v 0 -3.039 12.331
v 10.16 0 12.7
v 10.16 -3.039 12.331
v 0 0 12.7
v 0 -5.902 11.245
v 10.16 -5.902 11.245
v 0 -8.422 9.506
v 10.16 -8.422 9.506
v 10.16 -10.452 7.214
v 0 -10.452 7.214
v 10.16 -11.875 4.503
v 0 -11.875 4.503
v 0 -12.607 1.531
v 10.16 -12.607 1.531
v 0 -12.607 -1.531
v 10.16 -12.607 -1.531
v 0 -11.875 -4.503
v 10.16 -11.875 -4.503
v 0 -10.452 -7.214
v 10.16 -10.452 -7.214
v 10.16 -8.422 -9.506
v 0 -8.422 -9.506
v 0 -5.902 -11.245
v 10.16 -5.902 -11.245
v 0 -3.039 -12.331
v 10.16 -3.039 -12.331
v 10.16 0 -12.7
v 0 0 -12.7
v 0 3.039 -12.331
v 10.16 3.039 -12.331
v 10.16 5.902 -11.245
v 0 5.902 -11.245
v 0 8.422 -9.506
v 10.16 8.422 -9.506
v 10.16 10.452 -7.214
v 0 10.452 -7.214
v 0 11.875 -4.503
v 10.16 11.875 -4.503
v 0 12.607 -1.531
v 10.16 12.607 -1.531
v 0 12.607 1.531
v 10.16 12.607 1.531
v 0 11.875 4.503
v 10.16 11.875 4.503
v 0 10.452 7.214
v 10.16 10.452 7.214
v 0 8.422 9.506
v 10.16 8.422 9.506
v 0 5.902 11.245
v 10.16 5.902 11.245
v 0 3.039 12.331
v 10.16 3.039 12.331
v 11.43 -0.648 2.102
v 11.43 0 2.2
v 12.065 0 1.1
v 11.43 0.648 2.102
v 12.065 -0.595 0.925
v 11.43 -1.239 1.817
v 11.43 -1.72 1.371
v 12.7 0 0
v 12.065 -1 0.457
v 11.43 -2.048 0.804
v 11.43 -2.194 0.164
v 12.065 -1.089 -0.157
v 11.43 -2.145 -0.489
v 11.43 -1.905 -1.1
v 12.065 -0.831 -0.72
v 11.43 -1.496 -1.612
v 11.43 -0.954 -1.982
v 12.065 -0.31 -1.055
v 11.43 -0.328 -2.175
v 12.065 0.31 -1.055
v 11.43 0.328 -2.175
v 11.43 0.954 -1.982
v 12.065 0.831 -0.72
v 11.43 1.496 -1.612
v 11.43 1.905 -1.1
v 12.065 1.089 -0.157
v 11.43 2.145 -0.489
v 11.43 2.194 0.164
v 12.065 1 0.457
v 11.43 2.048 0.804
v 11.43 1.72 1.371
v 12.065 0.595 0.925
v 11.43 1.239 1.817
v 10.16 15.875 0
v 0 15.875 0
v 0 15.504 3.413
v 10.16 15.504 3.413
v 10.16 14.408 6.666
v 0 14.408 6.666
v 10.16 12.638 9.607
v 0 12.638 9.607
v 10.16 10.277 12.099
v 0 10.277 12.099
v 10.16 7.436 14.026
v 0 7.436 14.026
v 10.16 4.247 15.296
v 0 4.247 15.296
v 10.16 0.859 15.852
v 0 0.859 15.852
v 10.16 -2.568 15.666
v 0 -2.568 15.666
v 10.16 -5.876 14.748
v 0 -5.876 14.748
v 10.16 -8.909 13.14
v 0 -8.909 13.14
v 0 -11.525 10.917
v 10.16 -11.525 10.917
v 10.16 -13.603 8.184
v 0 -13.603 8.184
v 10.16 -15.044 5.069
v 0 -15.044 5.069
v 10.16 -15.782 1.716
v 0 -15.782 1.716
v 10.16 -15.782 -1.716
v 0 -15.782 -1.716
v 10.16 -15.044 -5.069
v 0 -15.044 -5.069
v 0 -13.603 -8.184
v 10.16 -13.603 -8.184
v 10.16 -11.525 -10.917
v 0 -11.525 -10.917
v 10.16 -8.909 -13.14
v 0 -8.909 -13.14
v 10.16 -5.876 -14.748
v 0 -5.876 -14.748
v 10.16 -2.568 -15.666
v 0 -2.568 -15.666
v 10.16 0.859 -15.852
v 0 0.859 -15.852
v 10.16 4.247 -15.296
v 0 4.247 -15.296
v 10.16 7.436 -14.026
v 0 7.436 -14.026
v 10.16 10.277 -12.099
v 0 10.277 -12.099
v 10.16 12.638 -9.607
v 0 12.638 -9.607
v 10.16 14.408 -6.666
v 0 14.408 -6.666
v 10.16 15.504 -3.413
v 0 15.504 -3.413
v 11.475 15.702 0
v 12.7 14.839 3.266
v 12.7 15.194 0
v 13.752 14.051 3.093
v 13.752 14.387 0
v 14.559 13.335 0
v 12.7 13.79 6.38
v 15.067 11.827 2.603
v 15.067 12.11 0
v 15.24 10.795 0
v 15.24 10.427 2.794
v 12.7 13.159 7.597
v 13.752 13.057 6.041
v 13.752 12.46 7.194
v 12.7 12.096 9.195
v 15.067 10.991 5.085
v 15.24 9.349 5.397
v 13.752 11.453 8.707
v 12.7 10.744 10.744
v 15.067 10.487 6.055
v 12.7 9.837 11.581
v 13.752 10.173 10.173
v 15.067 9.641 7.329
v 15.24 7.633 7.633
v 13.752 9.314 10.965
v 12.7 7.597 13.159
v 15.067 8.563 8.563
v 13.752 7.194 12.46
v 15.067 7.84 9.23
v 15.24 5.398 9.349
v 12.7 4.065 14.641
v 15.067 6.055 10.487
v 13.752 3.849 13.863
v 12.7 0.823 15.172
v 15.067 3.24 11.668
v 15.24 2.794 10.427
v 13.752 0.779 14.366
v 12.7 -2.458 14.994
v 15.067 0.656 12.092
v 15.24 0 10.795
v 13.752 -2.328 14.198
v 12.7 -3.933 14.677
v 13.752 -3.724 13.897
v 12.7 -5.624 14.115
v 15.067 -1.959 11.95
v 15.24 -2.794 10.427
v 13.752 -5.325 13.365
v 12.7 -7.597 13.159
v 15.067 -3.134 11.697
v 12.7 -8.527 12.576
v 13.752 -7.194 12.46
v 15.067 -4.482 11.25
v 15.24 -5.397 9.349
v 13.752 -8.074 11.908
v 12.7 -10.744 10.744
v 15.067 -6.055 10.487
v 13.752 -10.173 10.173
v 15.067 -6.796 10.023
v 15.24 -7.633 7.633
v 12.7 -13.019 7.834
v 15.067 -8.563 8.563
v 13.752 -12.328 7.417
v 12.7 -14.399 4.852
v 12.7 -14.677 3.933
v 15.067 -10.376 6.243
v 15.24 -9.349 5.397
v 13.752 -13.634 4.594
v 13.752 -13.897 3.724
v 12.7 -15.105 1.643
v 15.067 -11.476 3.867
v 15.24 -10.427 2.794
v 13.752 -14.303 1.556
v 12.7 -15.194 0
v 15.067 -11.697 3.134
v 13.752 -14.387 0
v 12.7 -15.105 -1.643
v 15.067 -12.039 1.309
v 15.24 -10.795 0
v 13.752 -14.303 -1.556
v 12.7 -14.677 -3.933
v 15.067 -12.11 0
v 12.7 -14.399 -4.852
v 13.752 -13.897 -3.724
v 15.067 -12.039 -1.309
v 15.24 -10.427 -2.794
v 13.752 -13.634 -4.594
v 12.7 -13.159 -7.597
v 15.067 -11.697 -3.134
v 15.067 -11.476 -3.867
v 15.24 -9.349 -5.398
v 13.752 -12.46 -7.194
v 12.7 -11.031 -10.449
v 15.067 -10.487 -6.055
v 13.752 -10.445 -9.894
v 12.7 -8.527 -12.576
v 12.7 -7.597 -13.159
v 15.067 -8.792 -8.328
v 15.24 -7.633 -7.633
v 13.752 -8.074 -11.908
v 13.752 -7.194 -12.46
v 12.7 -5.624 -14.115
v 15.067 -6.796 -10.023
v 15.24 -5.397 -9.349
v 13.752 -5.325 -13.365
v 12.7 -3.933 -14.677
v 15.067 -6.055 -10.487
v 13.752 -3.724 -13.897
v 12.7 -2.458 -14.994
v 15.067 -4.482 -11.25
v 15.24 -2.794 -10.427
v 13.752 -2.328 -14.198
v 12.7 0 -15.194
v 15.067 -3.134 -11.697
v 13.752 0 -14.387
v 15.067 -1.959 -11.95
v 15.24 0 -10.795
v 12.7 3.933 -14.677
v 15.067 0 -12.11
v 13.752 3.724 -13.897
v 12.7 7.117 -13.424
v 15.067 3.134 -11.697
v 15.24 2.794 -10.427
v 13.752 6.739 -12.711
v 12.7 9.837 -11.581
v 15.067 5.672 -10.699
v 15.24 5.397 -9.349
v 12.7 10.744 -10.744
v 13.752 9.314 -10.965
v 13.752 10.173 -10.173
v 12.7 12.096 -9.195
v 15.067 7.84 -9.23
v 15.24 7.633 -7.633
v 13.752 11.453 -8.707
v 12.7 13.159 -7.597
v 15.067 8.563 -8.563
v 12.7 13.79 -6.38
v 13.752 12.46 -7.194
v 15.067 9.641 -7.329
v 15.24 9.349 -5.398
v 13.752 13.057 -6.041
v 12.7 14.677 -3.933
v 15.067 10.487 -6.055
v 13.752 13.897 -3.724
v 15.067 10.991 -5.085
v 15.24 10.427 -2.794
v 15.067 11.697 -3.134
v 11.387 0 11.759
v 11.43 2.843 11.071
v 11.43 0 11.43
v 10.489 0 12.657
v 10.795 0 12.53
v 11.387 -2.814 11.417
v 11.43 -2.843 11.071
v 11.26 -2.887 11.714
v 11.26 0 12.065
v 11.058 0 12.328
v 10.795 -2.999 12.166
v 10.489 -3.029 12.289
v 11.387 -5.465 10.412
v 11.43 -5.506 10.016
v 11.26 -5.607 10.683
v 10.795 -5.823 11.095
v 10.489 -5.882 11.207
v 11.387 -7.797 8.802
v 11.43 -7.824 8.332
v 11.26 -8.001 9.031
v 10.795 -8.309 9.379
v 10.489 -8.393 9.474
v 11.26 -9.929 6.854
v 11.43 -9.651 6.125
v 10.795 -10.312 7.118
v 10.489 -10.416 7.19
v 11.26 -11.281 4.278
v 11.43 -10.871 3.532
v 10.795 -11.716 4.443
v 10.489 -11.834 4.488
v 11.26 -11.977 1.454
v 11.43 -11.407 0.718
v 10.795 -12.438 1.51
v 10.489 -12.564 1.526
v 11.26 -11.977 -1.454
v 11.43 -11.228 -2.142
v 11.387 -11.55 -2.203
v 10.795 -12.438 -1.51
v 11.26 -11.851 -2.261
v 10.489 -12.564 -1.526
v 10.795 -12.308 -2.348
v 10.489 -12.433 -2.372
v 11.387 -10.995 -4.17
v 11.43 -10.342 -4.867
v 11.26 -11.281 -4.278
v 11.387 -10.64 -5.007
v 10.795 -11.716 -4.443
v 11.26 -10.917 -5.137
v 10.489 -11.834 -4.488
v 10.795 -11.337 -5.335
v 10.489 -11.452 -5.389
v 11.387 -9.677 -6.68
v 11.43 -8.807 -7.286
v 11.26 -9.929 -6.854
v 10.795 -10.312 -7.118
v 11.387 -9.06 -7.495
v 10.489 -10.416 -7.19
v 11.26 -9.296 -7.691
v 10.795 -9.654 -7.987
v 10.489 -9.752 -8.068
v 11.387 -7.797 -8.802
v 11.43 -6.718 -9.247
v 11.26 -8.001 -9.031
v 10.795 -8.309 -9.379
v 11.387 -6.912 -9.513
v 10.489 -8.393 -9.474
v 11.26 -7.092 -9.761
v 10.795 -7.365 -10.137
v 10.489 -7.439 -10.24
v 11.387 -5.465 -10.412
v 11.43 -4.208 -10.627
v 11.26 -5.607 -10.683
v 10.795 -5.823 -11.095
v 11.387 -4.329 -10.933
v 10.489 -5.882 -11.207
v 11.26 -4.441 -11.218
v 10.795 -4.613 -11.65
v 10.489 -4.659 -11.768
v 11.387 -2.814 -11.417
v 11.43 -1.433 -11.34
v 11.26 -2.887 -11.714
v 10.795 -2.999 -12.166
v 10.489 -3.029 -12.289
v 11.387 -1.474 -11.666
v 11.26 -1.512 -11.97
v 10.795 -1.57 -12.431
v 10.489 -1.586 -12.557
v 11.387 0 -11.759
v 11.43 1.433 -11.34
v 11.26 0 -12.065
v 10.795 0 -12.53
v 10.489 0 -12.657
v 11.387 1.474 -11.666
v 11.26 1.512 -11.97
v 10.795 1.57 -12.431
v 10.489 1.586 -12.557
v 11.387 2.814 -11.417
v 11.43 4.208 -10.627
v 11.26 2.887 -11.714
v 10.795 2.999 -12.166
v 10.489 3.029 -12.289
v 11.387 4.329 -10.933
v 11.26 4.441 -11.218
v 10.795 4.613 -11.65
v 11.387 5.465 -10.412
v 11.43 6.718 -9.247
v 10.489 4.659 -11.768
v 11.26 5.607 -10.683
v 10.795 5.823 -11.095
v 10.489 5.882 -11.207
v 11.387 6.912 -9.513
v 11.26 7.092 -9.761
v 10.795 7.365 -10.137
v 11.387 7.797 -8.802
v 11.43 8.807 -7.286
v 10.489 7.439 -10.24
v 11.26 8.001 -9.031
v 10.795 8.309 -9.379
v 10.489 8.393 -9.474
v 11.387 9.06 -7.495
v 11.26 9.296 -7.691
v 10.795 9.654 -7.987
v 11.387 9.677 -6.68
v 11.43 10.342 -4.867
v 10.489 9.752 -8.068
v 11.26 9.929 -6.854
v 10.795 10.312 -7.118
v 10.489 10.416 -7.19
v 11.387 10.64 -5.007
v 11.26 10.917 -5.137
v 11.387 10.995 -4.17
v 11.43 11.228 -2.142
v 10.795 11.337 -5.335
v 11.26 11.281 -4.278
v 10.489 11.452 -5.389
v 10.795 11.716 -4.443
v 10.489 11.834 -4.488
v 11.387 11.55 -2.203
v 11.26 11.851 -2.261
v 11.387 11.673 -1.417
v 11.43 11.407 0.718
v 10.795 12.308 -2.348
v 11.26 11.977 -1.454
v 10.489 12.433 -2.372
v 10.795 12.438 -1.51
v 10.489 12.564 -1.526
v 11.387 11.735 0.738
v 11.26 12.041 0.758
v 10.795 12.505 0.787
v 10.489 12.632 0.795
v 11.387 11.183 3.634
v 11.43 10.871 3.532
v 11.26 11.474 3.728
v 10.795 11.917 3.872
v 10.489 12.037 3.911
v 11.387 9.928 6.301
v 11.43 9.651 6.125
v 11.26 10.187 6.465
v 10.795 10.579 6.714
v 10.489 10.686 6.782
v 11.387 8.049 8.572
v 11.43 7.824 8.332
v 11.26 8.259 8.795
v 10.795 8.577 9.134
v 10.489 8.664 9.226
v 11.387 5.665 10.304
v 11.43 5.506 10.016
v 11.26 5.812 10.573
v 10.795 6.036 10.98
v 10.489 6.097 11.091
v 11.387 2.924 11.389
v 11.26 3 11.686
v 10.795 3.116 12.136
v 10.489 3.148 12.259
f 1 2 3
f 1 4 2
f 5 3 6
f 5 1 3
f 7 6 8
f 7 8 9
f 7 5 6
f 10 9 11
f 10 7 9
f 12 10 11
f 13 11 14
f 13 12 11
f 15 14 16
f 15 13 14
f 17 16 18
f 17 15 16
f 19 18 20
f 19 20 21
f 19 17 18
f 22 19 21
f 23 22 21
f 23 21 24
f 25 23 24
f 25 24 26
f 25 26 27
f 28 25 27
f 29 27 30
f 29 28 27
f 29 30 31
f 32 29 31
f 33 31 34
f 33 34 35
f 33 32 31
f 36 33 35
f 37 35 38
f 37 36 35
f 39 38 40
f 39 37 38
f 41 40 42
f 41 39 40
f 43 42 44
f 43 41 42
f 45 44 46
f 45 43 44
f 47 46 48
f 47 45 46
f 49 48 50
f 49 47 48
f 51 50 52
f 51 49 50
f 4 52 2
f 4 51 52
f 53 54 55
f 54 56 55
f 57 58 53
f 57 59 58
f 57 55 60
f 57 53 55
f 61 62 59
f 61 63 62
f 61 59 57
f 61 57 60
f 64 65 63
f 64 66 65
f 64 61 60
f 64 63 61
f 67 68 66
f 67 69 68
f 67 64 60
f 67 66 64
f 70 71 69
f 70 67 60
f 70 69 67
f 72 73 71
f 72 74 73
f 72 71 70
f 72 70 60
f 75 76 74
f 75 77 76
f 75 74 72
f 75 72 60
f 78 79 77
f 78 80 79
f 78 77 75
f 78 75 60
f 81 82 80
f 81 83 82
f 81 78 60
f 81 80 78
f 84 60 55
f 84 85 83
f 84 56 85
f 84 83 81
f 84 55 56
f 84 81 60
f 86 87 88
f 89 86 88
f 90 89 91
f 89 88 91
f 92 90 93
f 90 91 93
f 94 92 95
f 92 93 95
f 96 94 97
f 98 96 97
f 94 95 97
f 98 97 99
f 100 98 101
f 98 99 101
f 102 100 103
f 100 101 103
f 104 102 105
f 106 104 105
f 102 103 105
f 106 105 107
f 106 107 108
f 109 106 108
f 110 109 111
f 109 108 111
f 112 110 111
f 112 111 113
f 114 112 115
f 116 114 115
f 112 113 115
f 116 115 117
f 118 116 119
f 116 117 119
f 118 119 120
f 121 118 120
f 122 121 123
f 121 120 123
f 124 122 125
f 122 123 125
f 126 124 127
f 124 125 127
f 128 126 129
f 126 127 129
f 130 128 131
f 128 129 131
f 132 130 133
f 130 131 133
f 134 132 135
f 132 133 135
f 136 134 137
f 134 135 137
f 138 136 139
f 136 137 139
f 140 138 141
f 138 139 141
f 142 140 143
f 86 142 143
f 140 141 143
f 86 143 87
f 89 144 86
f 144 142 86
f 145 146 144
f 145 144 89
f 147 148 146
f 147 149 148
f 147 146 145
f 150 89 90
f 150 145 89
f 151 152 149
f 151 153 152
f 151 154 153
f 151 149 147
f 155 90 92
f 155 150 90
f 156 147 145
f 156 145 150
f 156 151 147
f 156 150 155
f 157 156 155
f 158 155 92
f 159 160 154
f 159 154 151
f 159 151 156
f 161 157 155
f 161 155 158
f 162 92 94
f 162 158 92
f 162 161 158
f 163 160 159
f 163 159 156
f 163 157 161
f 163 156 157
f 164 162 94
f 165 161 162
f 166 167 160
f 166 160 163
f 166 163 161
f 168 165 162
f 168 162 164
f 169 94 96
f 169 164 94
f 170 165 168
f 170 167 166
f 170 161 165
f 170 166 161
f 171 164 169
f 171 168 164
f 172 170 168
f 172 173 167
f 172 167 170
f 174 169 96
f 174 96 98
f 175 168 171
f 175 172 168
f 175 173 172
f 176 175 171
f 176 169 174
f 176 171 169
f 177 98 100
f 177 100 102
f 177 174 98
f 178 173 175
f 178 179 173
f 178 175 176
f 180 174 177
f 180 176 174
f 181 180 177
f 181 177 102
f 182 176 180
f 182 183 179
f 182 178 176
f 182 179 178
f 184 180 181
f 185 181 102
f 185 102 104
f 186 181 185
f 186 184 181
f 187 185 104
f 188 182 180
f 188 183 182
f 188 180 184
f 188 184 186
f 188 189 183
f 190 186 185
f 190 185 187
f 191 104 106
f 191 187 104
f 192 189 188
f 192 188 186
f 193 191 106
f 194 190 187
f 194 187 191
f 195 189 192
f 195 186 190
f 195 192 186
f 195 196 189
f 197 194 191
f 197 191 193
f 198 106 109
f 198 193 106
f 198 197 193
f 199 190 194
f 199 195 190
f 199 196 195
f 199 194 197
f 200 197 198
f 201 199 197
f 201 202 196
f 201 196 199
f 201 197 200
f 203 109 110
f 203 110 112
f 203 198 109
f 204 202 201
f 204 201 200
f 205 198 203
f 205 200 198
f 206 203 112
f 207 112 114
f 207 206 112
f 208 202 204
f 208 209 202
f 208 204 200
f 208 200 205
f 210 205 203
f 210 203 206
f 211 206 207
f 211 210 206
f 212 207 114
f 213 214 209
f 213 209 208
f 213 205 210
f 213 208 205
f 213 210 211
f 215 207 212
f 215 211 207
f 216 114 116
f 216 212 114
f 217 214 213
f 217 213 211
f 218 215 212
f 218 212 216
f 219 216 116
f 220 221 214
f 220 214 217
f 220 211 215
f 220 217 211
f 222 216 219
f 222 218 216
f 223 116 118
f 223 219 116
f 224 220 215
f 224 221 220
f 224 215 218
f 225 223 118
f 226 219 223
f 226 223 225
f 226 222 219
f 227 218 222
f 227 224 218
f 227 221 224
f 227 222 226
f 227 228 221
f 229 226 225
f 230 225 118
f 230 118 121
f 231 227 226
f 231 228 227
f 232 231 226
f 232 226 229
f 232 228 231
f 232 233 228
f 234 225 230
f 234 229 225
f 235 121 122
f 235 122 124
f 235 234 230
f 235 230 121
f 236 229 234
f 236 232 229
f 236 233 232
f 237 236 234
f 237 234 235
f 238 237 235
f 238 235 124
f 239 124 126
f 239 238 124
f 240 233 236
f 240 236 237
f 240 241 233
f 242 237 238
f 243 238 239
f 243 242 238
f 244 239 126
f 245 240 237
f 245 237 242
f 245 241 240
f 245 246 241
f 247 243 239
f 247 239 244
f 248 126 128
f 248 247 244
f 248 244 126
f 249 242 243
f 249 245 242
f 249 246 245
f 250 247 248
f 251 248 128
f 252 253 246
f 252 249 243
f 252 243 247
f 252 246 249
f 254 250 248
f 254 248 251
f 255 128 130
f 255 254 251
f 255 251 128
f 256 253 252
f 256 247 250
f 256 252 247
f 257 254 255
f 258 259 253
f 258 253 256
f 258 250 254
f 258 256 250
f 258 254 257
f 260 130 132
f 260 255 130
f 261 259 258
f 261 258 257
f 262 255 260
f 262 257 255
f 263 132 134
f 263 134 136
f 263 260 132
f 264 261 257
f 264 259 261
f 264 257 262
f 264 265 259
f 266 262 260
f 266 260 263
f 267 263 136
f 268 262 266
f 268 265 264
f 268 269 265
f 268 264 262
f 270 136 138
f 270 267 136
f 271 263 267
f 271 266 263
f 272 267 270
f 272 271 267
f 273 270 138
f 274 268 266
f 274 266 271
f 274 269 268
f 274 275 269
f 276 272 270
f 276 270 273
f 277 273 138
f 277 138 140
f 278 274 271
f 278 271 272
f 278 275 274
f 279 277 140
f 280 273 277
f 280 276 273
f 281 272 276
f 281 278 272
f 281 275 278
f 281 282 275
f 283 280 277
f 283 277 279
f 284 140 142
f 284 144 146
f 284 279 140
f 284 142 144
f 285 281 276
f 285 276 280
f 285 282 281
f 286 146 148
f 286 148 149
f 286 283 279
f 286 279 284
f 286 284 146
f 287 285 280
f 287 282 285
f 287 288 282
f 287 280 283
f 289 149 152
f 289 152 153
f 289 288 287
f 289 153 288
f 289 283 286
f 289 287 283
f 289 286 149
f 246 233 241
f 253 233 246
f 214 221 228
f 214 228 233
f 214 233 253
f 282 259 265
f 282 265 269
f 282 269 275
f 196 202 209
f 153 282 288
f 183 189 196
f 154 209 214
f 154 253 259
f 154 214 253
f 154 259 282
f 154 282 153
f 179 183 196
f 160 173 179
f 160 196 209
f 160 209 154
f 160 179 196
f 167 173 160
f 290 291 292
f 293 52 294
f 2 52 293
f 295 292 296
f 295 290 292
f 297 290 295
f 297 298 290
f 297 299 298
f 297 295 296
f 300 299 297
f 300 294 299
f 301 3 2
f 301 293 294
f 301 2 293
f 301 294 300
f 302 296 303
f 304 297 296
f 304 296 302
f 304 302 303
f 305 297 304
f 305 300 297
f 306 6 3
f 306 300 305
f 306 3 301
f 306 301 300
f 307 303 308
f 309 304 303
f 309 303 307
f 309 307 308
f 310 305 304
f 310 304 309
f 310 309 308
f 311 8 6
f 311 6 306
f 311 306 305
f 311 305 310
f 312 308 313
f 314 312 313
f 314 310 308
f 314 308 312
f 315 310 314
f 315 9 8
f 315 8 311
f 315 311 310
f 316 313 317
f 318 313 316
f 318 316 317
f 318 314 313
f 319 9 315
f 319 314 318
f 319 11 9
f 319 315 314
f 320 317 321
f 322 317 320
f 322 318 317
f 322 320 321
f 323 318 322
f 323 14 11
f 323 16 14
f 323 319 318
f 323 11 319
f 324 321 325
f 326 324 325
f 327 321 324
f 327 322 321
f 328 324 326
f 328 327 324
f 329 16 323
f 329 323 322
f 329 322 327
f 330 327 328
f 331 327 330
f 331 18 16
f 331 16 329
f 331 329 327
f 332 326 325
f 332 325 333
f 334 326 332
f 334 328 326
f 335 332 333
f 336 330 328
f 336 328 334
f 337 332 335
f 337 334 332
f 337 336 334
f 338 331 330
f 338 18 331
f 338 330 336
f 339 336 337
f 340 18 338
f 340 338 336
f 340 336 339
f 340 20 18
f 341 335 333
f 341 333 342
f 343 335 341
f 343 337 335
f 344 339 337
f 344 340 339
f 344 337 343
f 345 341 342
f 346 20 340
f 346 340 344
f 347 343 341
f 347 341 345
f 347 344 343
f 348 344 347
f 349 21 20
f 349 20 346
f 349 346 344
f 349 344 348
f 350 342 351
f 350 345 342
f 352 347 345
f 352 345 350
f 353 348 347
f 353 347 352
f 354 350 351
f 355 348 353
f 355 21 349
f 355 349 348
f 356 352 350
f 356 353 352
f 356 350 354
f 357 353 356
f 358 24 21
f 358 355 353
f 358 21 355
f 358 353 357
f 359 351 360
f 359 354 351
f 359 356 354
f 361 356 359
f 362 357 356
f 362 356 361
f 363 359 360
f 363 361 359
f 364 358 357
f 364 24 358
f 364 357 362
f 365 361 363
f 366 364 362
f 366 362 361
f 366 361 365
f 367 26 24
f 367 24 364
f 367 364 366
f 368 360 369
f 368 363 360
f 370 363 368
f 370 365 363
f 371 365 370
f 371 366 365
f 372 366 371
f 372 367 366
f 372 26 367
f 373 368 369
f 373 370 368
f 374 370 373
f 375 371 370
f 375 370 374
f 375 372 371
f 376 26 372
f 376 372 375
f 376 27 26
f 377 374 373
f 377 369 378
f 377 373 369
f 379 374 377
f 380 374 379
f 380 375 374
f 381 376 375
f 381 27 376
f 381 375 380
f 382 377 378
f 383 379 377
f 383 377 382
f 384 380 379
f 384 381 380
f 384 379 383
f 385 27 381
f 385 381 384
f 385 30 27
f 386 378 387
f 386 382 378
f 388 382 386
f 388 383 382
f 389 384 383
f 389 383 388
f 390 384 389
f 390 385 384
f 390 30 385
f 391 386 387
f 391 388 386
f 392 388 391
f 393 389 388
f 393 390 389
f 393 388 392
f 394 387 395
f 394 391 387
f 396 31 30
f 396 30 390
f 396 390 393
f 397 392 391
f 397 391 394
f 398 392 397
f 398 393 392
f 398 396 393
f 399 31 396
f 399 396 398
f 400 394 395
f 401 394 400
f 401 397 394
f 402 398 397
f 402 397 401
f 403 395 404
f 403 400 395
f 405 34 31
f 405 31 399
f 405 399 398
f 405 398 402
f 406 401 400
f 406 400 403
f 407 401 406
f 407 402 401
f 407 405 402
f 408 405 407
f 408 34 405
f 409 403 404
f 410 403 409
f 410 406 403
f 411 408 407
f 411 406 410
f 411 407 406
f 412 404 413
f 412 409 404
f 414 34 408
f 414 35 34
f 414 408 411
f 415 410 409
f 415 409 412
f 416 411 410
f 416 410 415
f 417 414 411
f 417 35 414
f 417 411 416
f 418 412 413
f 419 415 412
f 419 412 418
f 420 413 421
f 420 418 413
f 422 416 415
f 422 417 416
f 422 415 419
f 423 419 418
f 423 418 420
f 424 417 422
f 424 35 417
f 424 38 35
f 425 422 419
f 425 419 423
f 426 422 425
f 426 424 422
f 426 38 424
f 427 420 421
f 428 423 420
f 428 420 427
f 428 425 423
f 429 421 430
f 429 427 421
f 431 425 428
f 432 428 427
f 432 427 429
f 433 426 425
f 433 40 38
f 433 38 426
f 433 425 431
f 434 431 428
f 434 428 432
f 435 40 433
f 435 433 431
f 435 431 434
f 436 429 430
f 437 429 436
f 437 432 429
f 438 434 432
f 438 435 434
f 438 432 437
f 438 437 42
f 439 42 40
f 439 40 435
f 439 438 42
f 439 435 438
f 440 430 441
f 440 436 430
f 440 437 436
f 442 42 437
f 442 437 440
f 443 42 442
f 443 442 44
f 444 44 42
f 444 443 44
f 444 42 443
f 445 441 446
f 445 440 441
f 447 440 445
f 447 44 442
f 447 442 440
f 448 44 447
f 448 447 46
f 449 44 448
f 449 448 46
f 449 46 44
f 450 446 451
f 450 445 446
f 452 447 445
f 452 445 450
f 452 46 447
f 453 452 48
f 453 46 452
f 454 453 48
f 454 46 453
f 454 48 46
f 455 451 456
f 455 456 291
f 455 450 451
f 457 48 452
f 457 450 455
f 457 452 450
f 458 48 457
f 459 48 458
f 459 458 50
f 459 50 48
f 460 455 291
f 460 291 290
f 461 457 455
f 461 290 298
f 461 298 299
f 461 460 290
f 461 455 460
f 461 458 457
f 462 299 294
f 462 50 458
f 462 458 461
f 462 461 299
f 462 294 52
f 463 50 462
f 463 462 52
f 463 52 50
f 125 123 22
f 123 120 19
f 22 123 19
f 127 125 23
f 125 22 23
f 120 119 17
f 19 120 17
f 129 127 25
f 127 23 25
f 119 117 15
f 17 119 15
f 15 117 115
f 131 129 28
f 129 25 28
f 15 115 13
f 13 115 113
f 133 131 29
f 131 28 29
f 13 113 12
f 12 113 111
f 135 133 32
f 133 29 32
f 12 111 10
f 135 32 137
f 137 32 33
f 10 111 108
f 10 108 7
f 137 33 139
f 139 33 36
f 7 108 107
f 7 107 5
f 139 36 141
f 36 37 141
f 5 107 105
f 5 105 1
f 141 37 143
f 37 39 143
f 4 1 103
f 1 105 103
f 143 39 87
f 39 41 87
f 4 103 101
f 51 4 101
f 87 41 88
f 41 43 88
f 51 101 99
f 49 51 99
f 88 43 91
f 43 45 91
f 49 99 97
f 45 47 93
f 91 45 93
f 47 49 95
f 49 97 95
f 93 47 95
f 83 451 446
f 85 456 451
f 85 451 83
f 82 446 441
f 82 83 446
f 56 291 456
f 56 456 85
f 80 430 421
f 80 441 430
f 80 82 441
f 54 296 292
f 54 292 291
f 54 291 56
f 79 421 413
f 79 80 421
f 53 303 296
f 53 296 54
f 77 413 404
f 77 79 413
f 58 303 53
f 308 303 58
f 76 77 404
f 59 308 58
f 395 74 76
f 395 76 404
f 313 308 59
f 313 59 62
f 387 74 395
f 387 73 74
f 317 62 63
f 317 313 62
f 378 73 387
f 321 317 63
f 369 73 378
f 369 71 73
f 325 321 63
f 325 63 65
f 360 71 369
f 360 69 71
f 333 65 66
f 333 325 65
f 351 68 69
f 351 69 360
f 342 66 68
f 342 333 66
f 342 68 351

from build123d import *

# Parameters (mm, degrees)
F0_R     = 15.875
F1_DEPTH = 15.24
F2_R     = 5.08


with BuildPart() as f1:
    # F0 (on Right) → F1 (new body)
    with BuildSketch(Plane.YZ):
        Circle(F0_R)
    extrude(amount=F1_DEPTH)

    # F2
    f2_edges = [f1.edges().sort_by_distance(p)[0] for p in [
        (15.24, -15.875, 0),
    ]]
    fillet(f2_edges, radius=F2_R)

    # F3 (on Front) → F4 (revolve, cut)
    with BuildSketch(Plane.XZ):
        with BuildLine():
            Line((0, 12.7), (0, 0))
            Line((0, 0), (12.7, 0))
            Line((12.7, 0), (11.43, 2.199705))
            Line((11.43, 2.199705), (11.43, 11.43))
            ThreePointArc((11.43, 11.43), (11.058026, 12.328026), (10.16, 12.7))
            Line((10.16, 12.7), (0, 12.7))
        make_face()
    revolve(axis=Axis((6.35, 0, 0), (1, 0, 0)), mode=Mode.SUBTRACT)


solid = f1.part
